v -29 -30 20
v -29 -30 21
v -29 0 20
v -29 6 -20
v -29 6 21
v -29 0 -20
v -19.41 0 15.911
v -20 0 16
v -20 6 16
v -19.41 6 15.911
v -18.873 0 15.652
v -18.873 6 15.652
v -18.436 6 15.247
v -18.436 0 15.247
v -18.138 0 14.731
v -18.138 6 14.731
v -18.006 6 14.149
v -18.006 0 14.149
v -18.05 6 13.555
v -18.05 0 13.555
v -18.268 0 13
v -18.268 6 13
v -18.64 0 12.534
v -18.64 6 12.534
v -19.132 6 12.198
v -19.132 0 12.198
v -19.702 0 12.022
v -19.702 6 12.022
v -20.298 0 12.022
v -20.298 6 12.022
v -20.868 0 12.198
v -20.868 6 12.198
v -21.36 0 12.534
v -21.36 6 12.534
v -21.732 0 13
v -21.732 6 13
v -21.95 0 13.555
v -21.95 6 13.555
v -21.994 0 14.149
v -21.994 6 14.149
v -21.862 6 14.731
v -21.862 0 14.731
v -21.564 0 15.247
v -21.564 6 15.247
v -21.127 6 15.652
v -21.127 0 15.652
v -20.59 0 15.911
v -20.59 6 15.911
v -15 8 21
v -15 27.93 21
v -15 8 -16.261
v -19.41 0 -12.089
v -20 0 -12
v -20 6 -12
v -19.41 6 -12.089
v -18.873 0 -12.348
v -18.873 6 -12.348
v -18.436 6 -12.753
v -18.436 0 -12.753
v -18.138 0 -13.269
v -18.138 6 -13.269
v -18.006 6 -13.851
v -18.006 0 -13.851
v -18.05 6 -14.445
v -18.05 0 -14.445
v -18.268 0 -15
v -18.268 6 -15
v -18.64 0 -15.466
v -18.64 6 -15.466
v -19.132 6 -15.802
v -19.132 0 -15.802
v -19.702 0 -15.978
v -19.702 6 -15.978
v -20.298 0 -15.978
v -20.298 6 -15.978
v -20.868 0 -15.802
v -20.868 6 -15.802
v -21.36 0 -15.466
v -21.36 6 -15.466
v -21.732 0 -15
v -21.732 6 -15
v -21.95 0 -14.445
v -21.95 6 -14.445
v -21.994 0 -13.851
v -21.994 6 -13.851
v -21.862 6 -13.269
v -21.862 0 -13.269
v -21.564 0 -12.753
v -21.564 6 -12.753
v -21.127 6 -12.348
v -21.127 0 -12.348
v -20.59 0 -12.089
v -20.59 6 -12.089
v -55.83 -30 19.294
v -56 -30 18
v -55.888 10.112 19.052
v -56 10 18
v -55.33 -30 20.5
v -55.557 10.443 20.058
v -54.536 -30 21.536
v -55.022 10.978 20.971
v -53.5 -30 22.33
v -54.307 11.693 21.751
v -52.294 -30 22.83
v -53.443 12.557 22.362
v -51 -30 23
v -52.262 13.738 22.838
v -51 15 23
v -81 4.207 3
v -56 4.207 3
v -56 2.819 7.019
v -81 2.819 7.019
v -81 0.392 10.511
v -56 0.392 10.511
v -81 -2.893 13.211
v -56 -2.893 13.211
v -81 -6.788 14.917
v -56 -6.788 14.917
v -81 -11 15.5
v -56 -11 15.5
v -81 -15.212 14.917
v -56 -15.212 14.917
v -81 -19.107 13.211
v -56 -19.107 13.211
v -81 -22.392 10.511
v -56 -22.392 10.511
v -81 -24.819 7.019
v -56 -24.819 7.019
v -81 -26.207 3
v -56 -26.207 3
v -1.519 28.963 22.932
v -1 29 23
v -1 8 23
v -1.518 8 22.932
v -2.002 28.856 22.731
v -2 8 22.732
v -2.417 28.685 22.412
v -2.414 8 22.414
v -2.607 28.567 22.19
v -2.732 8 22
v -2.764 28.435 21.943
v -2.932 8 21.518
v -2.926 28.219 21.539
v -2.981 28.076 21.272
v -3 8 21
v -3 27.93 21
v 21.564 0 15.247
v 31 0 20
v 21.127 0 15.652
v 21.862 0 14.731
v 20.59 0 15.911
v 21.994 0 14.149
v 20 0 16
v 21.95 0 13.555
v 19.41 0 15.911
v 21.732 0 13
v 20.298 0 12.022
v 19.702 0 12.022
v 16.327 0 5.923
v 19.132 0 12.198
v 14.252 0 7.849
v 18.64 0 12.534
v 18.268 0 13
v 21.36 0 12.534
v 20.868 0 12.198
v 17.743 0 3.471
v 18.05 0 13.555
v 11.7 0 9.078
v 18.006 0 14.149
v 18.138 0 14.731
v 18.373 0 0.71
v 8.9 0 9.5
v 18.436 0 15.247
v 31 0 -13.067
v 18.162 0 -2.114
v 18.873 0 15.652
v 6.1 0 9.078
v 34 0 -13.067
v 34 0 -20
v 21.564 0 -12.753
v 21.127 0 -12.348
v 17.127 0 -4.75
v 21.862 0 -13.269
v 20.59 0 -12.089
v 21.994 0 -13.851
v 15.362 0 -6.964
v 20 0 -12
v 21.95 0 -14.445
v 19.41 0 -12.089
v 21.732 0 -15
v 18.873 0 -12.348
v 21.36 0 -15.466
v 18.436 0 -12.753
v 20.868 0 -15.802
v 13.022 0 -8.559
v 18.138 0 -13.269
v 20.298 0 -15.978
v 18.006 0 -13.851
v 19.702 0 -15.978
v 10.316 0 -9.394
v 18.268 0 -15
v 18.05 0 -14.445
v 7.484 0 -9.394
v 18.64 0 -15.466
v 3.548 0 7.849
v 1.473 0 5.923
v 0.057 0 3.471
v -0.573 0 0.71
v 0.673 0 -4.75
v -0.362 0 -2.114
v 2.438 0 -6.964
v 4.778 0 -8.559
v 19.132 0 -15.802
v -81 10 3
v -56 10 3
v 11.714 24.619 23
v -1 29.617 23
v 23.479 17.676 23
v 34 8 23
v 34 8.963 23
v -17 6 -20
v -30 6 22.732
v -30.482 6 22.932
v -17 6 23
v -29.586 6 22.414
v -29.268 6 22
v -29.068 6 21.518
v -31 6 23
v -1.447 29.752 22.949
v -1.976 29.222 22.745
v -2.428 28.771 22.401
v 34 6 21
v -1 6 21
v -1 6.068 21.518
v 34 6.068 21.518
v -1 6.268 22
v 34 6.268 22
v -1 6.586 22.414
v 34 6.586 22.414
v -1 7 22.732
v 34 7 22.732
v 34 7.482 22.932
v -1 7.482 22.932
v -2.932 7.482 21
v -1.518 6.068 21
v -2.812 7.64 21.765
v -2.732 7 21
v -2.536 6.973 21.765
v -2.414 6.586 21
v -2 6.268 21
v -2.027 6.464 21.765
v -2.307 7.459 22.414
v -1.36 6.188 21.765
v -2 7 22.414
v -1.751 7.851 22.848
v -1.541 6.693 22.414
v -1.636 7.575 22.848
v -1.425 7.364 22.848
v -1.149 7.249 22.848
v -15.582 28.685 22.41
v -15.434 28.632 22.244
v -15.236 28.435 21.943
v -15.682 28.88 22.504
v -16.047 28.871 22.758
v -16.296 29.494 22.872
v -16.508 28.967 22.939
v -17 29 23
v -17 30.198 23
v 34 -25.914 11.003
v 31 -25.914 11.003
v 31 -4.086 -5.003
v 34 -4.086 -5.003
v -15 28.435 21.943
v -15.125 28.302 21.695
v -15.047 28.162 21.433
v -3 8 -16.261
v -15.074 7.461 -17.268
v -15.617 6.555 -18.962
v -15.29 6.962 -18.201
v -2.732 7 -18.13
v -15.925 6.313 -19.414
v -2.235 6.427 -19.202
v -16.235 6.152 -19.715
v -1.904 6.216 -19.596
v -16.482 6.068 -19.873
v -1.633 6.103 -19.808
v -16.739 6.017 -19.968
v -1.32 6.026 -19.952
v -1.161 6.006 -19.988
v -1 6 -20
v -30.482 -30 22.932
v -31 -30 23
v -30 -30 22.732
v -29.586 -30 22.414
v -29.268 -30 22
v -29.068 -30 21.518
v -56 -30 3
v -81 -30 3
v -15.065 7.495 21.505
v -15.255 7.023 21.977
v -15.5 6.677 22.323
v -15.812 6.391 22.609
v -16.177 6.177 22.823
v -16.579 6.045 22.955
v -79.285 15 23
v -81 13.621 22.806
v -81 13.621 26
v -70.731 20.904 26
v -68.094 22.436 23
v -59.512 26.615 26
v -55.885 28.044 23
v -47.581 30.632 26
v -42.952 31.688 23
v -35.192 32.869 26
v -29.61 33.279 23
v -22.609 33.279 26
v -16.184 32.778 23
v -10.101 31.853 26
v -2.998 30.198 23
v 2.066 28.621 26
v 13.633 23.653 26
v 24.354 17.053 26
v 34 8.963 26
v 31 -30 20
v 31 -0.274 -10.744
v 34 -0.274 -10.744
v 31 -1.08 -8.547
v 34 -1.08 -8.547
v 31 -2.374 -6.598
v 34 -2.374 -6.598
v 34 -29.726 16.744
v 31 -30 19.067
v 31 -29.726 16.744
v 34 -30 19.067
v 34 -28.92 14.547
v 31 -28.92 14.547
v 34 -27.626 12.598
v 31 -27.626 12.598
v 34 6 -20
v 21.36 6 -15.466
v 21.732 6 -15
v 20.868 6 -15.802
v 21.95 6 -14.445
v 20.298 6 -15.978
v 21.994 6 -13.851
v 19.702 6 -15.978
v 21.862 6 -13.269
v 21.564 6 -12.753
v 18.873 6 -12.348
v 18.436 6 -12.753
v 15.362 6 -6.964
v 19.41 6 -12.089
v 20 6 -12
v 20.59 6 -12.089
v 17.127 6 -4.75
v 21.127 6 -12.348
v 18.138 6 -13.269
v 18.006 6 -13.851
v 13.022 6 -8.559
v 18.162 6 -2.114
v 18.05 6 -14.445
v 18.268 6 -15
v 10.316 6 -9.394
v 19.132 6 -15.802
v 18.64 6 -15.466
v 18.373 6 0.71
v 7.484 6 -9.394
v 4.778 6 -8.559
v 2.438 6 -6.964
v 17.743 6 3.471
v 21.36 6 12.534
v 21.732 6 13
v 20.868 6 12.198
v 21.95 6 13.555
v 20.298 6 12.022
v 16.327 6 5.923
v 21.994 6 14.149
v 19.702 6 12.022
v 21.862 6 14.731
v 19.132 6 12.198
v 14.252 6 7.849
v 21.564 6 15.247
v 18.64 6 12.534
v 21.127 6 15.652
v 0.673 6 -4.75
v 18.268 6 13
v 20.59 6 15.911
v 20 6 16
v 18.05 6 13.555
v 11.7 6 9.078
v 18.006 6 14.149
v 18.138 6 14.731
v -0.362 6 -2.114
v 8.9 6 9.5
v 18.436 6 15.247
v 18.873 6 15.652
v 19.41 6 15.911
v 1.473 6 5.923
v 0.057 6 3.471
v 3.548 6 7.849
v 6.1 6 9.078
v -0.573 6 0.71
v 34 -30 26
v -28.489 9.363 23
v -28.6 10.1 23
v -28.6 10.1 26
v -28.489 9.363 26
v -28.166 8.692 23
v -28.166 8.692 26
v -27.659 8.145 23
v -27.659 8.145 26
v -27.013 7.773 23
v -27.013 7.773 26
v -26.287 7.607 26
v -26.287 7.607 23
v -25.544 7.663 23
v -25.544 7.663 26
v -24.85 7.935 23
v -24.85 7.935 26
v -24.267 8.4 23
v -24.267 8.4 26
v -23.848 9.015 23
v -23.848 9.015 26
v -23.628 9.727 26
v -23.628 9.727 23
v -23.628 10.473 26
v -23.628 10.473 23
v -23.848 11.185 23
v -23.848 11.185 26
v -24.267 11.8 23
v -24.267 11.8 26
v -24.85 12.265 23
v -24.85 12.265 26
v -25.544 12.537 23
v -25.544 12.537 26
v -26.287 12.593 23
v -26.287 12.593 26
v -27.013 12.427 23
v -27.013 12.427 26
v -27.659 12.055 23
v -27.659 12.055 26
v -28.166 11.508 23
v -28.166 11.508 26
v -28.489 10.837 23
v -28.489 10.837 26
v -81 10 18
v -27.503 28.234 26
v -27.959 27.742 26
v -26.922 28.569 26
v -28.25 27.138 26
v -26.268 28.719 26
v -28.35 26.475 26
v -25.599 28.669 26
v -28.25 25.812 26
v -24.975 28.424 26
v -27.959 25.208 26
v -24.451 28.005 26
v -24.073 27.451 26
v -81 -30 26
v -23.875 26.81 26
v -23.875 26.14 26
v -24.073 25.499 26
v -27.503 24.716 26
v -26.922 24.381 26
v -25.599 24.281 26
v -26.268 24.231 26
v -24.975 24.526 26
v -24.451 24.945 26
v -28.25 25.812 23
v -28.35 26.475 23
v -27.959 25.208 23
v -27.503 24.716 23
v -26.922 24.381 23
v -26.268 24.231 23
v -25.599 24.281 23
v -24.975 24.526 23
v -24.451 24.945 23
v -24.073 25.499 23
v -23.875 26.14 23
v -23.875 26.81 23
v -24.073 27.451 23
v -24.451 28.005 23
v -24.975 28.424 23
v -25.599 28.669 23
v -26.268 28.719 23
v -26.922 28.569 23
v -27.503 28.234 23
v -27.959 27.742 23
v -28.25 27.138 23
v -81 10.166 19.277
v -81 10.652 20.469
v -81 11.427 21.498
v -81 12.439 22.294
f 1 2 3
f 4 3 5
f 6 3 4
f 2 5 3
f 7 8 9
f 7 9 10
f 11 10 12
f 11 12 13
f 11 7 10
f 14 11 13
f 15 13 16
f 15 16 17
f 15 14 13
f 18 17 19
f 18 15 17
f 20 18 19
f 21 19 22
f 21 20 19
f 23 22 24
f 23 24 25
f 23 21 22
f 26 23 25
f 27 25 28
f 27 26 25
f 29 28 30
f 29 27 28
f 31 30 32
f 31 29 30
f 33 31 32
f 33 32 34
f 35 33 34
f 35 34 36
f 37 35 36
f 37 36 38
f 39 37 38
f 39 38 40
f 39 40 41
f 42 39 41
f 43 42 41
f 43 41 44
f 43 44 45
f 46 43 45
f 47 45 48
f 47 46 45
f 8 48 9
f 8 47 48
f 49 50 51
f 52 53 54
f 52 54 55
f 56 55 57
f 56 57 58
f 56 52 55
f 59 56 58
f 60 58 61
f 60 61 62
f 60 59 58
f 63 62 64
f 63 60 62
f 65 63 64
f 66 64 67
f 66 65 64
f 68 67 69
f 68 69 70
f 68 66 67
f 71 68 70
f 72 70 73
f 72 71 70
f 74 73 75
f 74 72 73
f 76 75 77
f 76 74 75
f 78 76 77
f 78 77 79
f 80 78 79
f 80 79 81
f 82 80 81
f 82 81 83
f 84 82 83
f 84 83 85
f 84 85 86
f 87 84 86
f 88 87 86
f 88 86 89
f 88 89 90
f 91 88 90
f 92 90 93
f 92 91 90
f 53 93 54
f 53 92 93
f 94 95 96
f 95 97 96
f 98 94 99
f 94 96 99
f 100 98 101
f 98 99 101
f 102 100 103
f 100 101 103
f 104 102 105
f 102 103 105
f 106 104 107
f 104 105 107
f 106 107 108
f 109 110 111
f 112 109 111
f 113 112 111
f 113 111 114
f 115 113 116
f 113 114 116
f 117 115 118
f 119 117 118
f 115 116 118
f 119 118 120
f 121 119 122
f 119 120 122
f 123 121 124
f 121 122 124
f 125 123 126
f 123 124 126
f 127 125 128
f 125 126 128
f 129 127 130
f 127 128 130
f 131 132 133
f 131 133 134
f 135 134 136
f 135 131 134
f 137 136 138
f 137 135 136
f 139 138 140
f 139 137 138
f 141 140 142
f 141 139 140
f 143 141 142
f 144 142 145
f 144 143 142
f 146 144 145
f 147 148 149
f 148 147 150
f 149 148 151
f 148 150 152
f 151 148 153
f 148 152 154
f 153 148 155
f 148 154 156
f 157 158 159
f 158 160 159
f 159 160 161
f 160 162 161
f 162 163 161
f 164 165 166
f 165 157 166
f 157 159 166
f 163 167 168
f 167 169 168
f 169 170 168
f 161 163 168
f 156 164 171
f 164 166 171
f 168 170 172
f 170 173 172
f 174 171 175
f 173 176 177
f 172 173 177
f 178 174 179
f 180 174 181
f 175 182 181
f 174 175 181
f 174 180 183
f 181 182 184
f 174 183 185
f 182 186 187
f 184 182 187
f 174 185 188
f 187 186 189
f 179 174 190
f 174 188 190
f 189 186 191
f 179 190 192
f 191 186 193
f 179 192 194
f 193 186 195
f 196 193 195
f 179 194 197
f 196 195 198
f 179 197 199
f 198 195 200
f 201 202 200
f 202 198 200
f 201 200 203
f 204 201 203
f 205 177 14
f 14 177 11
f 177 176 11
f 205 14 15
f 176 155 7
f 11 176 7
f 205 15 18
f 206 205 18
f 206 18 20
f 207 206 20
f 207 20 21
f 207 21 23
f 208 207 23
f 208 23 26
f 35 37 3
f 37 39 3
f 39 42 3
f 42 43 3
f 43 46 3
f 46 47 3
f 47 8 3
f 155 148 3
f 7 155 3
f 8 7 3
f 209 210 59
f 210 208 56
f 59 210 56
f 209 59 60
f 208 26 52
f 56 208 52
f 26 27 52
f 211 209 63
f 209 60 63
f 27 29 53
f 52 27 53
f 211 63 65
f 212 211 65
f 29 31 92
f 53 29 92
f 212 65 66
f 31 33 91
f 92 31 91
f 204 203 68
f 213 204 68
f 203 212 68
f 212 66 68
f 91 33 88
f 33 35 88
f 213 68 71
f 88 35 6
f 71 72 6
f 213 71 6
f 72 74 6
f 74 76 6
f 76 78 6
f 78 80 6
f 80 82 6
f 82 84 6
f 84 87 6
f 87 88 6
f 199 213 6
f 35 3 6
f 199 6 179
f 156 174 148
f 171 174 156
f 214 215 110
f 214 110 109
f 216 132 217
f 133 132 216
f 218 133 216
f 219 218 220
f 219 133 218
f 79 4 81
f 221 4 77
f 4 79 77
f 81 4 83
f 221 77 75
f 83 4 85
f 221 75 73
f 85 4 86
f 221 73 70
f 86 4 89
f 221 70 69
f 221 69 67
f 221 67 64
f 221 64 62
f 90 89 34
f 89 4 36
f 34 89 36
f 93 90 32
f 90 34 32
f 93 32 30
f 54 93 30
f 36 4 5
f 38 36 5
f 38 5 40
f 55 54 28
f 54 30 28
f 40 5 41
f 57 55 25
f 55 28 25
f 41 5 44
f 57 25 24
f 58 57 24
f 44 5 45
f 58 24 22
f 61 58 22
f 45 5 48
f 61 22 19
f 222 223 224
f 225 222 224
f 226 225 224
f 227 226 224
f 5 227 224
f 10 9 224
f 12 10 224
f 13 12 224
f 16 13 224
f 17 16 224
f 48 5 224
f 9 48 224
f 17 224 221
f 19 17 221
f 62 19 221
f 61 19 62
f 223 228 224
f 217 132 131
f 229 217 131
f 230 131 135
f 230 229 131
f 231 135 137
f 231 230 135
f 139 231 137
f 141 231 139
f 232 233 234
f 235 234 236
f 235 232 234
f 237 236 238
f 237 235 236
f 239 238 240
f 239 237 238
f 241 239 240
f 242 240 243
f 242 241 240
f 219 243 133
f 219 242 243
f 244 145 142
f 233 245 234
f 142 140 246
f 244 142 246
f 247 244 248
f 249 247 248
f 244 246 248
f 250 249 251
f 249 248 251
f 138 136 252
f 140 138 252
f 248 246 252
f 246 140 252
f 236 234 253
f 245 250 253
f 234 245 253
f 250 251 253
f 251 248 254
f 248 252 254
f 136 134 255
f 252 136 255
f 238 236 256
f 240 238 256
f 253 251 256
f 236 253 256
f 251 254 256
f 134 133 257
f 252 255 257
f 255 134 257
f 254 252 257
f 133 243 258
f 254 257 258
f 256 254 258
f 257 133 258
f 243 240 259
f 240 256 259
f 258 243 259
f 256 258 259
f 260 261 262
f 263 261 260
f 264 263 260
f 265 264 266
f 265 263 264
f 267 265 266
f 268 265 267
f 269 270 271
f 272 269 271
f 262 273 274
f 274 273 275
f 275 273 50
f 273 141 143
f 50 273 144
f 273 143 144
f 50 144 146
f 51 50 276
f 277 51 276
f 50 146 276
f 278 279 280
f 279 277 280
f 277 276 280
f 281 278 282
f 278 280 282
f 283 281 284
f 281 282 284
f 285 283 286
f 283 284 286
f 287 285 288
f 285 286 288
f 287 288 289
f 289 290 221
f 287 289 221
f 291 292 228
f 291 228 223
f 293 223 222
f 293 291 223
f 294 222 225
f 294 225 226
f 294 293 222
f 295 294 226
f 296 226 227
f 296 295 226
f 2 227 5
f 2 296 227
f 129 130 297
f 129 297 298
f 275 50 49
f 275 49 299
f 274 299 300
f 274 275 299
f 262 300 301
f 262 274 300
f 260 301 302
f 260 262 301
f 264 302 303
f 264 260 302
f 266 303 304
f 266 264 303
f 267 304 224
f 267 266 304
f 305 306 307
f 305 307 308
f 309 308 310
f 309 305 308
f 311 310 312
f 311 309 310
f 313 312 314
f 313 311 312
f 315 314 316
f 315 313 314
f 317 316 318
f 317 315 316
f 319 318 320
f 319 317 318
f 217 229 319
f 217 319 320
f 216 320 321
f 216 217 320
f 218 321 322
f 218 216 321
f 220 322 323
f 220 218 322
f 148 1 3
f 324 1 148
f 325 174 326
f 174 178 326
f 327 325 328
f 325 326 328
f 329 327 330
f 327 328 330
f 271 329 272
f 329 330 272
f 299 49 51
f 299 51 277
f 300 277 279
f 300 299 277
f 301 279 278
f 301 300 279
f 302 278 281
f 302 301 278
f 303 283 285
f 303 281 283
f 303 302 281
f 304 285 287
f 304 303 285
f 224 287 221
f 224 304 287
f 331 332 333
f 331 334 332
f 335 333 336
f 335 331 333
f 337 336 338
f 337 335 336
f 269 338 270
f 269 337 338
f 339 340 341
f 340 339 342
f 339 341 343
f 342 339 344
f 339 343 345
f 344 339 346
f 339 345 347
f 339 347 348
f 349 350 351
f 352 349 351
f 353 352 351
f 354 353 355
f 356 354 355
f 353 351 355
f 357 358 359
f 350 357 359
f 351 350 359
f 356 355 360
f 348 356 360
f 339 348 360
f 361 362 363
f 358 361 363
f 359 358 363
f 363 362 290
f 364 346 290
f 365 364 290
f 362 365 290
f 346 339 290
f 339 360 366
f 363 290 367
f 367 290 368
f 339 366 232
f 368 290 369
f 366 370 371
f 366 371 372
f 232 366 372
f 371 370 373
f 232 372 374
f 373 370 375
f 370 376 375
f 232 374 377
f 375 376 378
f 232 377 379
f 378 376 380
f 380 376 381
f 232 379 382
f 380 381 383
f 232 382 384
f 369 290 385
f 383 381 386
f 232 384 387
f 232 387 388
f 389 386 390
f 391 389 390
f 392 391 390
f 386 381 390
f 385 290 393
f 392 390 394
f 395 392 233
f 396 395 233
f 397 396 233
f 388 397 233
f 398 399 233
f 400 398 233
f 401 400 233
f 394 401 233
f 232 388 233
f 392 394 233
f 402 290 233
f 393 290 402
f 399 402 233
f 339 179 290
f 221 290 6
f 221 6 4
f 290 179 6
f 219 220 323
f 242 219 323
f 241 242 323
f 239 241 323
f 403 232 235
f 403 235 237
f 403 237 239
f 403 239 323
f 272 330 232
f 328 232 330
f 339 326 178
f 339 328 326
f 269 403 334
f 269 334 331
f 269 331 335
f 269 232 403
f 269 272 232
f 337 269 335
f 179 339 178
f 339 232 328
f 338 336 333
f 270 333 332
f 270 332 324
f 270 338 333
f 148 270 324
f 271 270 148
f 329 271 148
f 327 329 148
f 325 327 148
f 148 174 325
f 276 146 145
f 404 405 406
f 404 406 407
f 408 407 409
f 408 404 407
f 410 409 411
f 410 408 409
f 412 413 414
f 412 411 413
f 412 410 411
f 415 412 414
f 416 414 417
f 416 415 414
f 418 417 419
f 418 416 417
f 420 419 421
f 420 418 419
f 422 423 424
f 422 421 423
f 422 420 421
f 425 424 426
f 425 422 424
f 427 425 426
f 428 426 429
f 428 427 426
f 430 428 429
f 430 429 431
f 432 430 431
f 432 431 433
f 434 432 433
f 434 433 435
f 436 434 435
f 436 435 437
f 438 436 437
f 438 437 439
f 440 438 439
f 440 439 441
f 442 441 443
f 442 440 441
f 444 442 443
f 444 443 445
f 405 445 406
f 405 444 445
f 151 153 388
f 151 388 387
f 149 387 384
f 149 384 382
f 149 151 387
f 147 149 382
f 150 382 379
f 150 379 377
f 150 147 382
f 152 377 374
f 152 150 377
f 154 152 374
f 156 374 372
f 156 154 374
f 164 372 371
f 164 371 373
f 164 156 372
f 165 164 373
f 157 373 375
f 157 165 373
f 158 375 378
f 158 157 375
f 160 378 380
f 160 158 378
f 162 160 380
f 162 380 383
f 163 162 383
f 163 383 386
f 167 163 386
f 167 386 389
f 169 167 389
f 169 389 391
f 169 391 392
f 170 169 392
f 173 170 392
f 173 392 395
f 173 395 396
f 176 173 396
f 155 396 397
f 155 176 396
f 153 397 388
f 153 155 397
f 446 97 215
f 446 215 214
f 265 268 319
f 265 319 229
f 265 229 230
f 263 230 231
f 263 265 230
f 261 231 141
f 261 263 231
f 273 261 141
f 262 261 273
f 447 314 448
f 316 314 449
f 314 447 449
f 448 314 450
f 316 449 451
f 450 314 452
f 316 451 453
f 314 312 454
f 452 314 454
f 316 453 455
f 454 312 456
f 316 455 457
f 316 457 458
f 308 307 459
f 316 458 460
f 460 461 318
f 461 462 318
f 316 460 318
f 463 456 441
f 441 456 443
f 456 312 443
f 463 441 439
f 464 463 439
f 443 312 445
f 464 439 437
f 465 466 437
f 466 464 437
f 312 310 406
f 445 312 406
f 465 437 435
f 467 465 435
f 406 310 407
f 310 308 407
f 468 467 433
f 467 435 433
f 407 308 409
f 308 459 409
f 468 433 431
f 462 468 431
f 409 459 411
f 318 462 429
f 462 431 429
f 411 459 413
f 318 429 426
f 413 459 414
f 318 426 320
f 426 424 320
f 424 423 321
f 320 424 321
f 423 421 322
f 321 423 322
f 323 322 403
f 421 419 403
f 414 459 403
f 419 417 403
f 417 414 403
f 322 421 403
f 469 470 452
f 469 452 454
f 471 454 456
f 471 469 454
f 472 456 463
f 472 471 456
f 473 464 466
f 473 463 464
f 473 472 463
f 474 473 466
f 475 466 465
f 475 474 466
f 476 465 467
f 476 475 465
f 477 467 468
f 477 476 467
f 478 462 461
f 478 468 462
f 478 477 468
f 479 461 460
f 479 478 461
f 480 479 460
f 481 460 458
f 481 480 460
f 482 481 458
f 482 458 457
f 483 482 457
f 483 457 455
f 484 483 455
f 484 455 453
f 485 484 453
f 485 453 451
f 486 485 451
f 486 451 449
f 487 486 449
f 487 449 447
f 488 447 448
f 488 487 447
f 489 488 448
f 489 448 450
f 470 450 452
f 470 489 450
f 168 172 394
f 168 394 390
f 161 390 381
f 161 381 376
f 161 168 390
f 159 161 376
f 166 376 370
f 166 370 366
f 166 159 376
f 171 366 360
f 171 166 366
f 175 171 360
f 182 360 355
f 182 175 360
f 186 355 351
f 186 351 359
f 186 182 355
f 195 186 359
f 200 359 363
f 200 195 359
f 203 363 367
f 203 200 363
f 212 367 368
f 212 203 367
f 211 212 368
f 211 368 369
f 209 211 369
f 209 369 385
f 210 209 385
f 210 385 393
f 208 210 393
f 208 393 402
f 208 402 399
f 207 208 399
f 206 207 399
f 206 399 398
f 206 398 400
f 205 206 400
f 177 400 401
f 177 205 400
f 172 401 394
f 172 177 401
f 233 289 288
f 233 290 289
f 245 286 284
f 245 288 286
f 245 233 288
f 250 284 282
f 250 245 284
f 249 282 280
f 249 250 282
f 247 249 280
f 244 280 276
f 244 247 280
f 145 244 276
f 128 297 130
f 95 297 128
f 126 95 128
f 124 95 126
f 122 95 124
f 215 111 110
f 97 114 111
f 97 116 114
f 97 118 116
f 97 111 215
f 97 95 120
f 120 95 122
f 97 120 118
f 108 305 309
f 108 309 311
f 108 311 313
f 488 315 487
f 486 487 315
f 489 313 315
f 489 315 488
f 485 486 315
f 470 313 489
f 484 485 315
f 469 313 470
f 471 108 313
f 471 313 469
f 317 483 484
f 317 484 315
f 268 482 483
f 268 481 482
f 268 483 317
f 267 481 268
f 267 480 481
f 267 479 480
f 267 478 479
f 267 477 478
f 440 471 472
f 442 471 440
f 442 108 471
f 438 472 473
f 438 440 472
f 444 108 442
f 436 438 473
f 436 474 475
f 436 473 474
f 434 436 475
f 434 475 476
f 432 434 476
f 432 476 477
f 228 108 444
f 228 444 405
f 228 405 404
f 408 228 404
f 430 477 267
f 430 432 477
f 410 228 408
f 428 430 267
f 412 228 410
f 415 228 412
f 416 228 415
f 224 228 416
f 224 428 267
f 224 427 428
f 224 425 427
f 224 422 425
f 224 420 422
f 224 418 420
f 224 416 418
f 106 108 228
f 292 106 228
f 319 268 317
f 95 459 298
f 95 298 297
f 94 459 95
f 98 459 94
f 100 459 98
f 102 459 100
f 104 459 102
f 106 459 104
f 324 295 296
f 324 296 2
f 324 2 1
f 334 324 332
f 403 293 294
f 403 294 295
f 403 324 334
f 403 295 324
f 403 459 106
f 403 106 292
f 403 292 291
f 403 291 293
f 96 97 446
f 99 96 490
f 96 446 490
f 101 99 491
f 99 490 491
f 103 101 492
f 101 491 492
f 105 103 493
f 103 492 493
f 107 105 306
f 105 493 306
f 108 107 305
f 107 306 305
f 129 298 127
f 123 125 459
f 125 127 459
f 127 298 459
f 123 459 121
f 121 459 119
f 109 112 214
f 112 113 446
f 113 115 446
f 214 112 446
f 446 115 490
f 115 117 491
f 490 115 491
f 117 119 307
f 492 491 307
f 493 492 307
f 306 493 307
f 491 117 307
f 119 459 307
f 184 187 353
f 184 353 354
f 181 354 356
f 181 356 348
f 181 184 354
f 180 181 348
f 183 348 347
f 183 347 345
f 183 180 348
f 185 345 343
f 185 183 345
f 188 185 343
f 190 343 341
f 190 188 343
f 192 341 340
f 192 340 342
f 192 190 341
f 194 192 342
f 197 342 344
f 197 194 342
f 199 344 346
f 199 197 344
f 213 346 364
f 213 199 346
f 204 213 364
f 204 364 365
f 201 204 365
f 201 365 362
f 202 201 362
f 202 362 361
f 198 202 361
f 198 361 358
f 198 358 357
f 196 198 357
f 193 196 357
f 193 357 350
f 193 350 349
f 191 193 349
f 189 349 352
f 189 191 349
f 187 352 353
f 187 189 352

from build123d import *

# Parameters (mm, degrees)
SKETCH2_W                      = 58
SKETCH2_H                      = 40
SKETCH2_R                      = 2
SKETCH2_R_2                    = 9.5
BOSS_EXTRUDE1_DEPTH            = 6
BOSS_EXTRUDE2_DEPTH            = 6
BOSS_EXTRUDE2_DEPTH_BACK       = 30
SKETCH3_W                      = 58
SKETCH3_H                      = 3
BOSS_EXTRUDE4_DEPTH            = 39
BOSS_EXTRUDE4_DEPTH_BACK       = 30
SKETCH7_W                      = 115
SKETCH7_H                      = 3
CUT_EXTRUDE1_DEPTH             = 94.584186698
SKETCH5_R                      = 2.25
SKETCH5_R_2                    = 2.5
CUT_EXTRUDE2_DEPTH             = 92.374080023
BOSS_EXTRUDE3_DEPTH            = 10
BOSS_EXTRUDE3_DEPTH_BACK       = 2
SKETCH8_W                      = 25
SKETCH8_H                      = 40
BOSS_EXTRUDE5_DEPTH            = 20
SKETCH9_R                      = 15.499999921
CUT_EXTRUDE3_DEPTH             = 80.228924642
BOSS_EXTRUDE6_DEPTH            = 5
FILLET2_R                      = 5
CUT_EXTRUDE4_REACH             = 93.374
SKETCH12_W                     = 2
SKETCH12_H                     = 30
CUT_EXTRUDE4_DIRECTION_2_DEPTH = 92.374080176
FILLET1_R                      = 2
FILLET3_R                      = 10


with BuildPart() as part:
    # Sketch2 → Boss-Extrude1 (new body)
    with BuildSketch(Plane(origin=(0, 0, 0), x_dir=(1, 0, 0), z_dir=(0, 1, 0))):
        Rectangle(SKETCH2_W, SKETCH2_H)
        with Locations(Location((-20, 14, 0), (0, 0, 270))):
            Circle(SKETCH2_R, mode=Mode.SUBTRACT)
        with Locations(Location((20, 14, 0), (0, 0, 270))):
            Circle(SKETCH2_R, mode=Mode.SUBTRACT)
        with Locations(Location((20, -14, 0), (0, 0, 270))):
            Circle(SKETCH2_R, mode=Mode.SUBTRACT)
        with Locations(Location((-20, -14, 0), (0, 0, 270))):
            Circle(SKETCH2_R, mode=Mode.SUBTRACT)
        with Locations(Location((8.9, 0, 0), (0, 0, 270))):
            Circle(SKETCH2_R_2, mode=Mode.SUBTRACT)
    extrude(amount=BOSS_EXTRUDE1_DEPTH)

    # Sketch3 → Boss-Extrude2 (add, two sides: drawn at the far end of the back side and taken through both)
    with BuildSketch(Plane(origin=(0, 0, 0), x_dir=(1, 0, 0), z_dir=(0, 1, 0)).offset(-BOSS_EXTRUDE2_DEPTH_BACK)):
        with Locations((0, -21.5)):
            Rectangle(SKETCH3_W, SKETCH3_H)
    extrude(amount=BOSS_EXTRUDE2_DEPTH + BOSS_EXTRUDE2_DEPTH_BACK)

    # Sketch7 → Boss-Extrude4 (add, two sides: drawn at the far end of the back side and taken through both)
    with BuildSketch(Plane(origin=(0, 0, 0), x_dir=(1, 0, 0), z_dir=(0, 1, 0)).offset(-BOSS_EXTRUDE4_DEPTH_BACK)):
        with Locations((-23.5, -24.5)):
            Rectangle(SKETCH7_W, SKETCH7_H)
    extrude(amount=BOSS_EXTRUDE4_DEPTH + BOSS_EXTRUDE4_DEPTH_BACK)

    # Sketch4 → Cut-Extrude1 (cut, through all)
    with BuildSketch(Plane.XY):
        with BuildLine():
            Line((-81, 13.621067419), (-81, 45.200754785))
            Line((-81, 45.200754785), (34, 45.200754785))
            Line((34, 45.200754785), (34, 8.963176429))
            ThreePointArc((34, 8.963176429), (-22.609442943, 33.279339271), (-81, 13.621067419))
        make_face()
    extrude(amount=CUT_EXTRUDE1_DEPTH, mode=Mode.SUBTRACT)

    # Sketch5 → Cut-Extrude2 (cut, through all)
    with BuildSketch(Plane.XY):
        with Locations(Location((-26.099999185, 26.475, 0), (0, 0, 180))):
            Circle(SKETCH5_R)
        with Locations(Location((-26.099999185, 10.1, 0), (0, 0, 180))):
            Circle(SKETCH5_R_2)
    extrude(amount=CUT_EXTRUDE2_DEPTH, mode=Mode.SUBTRACT)

    # Sketch6 → Boss-Extrude3 (add, two sides: drawn at the far end of the back side and taken through both)
    with BuildSketch(Plane(origin=(-13, 0, 0), x_dir=(0, 0, -1), z_dir=(1, 0, 0)).offset(-BOSS_EXTRUDE3_DEPTH_BACK)):
        Polygon((20, 6), (-23, 29), (-23, 6), align=None)
    extrude(amount=BOSS_EXTRUDE3_DEPTH + BOSS_EXTRUDE3_DEPTH_BACK)

    # Sketch8 → Boss-Extrude5 (add)
    with BuildSketch(Plane(origin=(0, 0, 23), x_dir=(-1, 0, 0), z_dir=(0, 0, -1))):
        with Locations((68.5, -10)):
            Rectangle(SKETCH8_W, SKETCH8_H)
    extrude(amount=BOSS_EXTRUDE5_DEPTH)

    # Sketch9 → Cut-Extrude3 (cut, through all)
    with BuildSketch(Plane(origin=(-33, 0, 0), x_dir=(0, 0, -1), z_dir=(1, 0, 0))):
        with Locations((-2.25e-07, -11)):
            Circle(SKETCH9_R)
    extrude(amount=-CUT_EXTRUDE3_DEPTH, mode=Mode.SUBTRACT)

    # Sketch10 → Boss-Extrude6 (add)
    with BuildSketch(Plane(origin=(29, 0, 0), x_dir=(0, 0, -1), z_dir=(1, 0, 0))):
        Polygon((20, 0), (20, 6), (-26, 6), (-26, -30), (-14, -30), (8, 0), align=None)
    extrude(amount=BOSS_EXTRUDE6_DEPTH)

    # Fillet2
    fillet2_edges = [part.edges().sort_by_distance(p)[0] for p in [
        (-68.5, 10, 23),
        (-56, -10, 23),
    ]]
    fillet(fillet2_edges, radius=FILLET2_R)

    # Cut-Extrude4: up to this face of the body (flat: up to its plane)
    cut_extrude4_end = Plane(part.part.faces().sort_by_distance((0, -15, 20))[0])
    # Sketch12 → Cut-Extrude4 (cut, up to the picked face)
    with BuildSketch(Plane.XY, mode=Mode.PRIVATE) as cut_extrude4_sk1:
        with Locations((30, -15)):
            Rectangle(SKETCH12_W, SKETCH12_H)
    cut_extrude4_tool1 = split(extrude(cut_extrude4_sk1.sketch, amount=CUT_EXTRUDE4_REACH, mode=Mode.PRIVATE), bisect_by=cut_extrude4_end, keep=Keep.BOTH, mode=Mode.PRIVATE)
    add(cut_extrude4_tool1.solids().sort_by(Axis((30, -15, 0), (0, 0, 1)))[0], mode=Mode.SUBTRACT)

    # Sketch12 → Cut-Extrude4 direction 2 (cut)
    with BuildSketch(Plane.XY):
        with Locations((30, -15)):
            Rectangle(SKETCH12_W, SKETCH12_H)
    extrude(amount=-CUT_EXTRUDE4_DIRECTION_2_DEPTH, mode=Mode.SUBTRACT)

    # Fillet1
    # the kernel refuses this fillet: 2 mm, written as the material it adds along each edge
    with BuildSketch(Plane(origin=(-1, 8, 21), x_dir=(-1, 0, 0), z_dir=(0, 0, 1))) as fillet1_piece_1_section:
        Polygon((0, 0), (FILLET1_R * 1.02, 0), (FILLET1_R * 1.02, FILLET1_R * 1.02), (0, FILLET1_R * 1.02), align=None)
    fillet1_piece_1 = extrude(amount=FILLET1_R * 1.02, mode=Mode.PRIVATE)
    fillet1_piece_1 = fillet1_piece_1 - Plane(origin=(-1, 8, 21), x_dir=(0.7071067811865475, 0.7071067811865475, 0), z_dir=(0, 0, 1)) * Sphere(FILLET1_R, mode=Mode.PRIVATE)
    add(fillet1_piece_1)
    with BuildSketch(Plane(origin=(-15, 6, 23), x_dir=(0, 1, 0), z_dir=(0, 0, -1))) as fillet1_piece_2_section:
        with BuildLine():
            CenterArc((FILLET1_R, -FILLET1_R), FILLET1_R, 90, 90)
            Line((0, -FILLET1_R), (-FILLET1_R * 0.02, -FILLET1_R))
            Line((-FILLET1_R * 0.02, -FILLET1_R), (-FILLET1_R * 0.02, FILLET1_R * 0.02))
            Line((-FILLET1_R * 0.02, FILLET1_R * 0.02), (FILLET1_R, FILLET1_R * 0.02))
            Line((FILLET1_R, FILLET1_R * 0.02), (FILLET1_R, 0))
        make_face()
    fillet1_piece_2 = extrude(amount=43, mode=Mode.PRIVATE)
    fillet1_piece_2 = split(fillet1_piece_2, bisect_by=Plane(origin=(-15.457624132, 15.214131113, -2.773580962), z_dir=(0, -0.8817846419346917, 0.47165225033716063)), keep=Keep.TOP, mode=Mode.PRIVATE)
    add(fillet1_piece_2)
    with BuildSketch(Plane(origin=(-3, 6, 21), x_dir=(0, 1, 0), z_dir=(0, 0, -1))) as fillet1_piece_3_section:
        with BuildLine():
            CenterArc((FILLET1_R, FILLET1_R), FILLET1_R, 180, 90)
            Line((0, FILLET1_R), (-FILLET1_R * 0.02, FILLET1_R))
            Line((-FILLET1_R * 0.02, FILLET1_R), (-FILLET1_R * 0.02, -FILLET1_R * 0.02))
            Line((-FILLET1_R * 0.02, -FILLET1_R * 0.02), (FILLET1_R, -FILLET1_R * 0.02))
            Line((FILLET1_R, -FILLET1_R * 0.02), (FILLET1_R, 0))
        make_face()
    fillet1_piece_3 = extrude(amount=41, mode=Mode.PRIVATE)
    fillet1_piece_3 = split(fillet1_piece_3, bisect_by=Plane(origin=(-2.542135078, 14.797986004, -3.551591383), z_dir=(0, -0.8817846419346917, 0.47165225033716063)), keep=Keep.TOP, mode=Mode.PRIVATE)
    add(fillet1_piece_3)
    with BuildSketch(Plane(origin=(-3, 34, 23), x_dir=(1, 0, 0), z_dir=(0, -1, 0))) as fillet1_piece_4_section:
        with BuildLine():
            CenterArc((FILLET1_R, -FILLET1_R), FILLET1_R, 90, 90)
            Line((0, -FILLET1_R), (-FILLET1_R * 0.02, -FILLET1_R))
            Line((-FILLET1_R * 0.02, -FILLET1_R), (-FILLET1_R * 0.02, FILLET1_R * 0.02))
            Line((-FILLET1_R * 0.02, FILLET1_R * 0.02), (FILLET1_R, FILLET1_R * 0.02))
            Line((FILLET1_R, FILLET1_R * 0.02), (FILLET1_R, 0))
        make_face()
    fillet1_piece_4 = extrude(amount=26, mode=Mode.PRIVATE)
    fillet1_piece_4 = split(fillet1_piece_4, bisect_by=Plane(origin=(-2.544379772, 26.451239118, 18.234925307), z_dir=(0, -0.8817846419346917, 0.47165225033716063)), keep=Keep.TOP, mode=Mode.PRIVATE)
    add(fillet1_piece_4)
    with BuildSketch(Plane(origin=(34, 6, 23), x_dir=(0, 1, 0), z_dir=(-1, 0, 0))) as fillet1_piece_5:
        with BuildLine():
            CenterArc((FILLET1_R, FILLET1_R), FILLET1_R, 180, 90)
            Line((0, FILLET1_R), (-FILLET1_R * 0.02, FILLET1_R))
            Line((-FILLET1_R * 0.02, FILLET1_R), (-FILLET1_R * 0.02, -FILLET1_R * 0.02))
            Line((-FILLET1_R * 0.02, -FILLET1_R * 0.02), (FILLET1_R, -FILLET1_R * 0.02))
            Line((FILLET1_R, -FILLET1_R * 0.02), (FILLET1_R, 0))
        make_face()
    extrude(amount=35)
    with BuildSketch(Plane(origin=(-15, 34, 23), x_dir=(-1, 0, 0), z_dir=(0, -1, 0))) as fillet1_piece_6_section:
        with BuildLine():
            CenterArc((FILLET1_R, FILLET1_R), FILLET1_R, 180, 90)
            Line((0, FILLET1_R), (-FILLET1_R * 0.02, FILLET1_R))
            Line((-FILLET1_R * 0.02, FILLET1_R), (-FILLET1_R * 0.02, -FILLET1_R * 0.02))
            Line((-FILLET1_R * 0.02, -FILLET1_R * 0.02), (FILLET1_R, -FILLET1_R * 0.02))
            Line((FILLET1_R, -FILLET1_R * 0.02), (FILLET1_R, 0))
        make_face()
    fillet1_piece_6 = extrude(amount=28, mode=Mode.PRIVATE)
    fillet1_piece_6 = split(fillet1_piece_6, bisect_by=Plane(origin=(-15.455371522, 26.228583138, 17.818655432), z_dir=(0, -0.8817846419346917, 0.47165225033716063)), keep=Keep.TOP, mode=Mode.PRIVATE)
    add(fillet1_piece_6)
    with BuildSketch(Plane(origin=(-29, -30, 23), x_dir=(-1, 0, 0), z_dir=(0, 1, 0))) as fillet1_piece_7:
        with BuildLine():
            CenterArc((FILLET1_R, -FILLET1_R), FILLET1_R, 90, 90)
            Line((0, -FILLET1_R), (-FILLET1_R * 0.02, -FILLET1_R))
            Line((-FILLET1_R * 0.02, -FILLET1_R), (-FILLET1_R * 0.02, FILLET1_R * 0.02))
            Line((-FILLET1_R * 0.02, FILLET1_R * 0.02), (FILLET1_R, FILLET1_R * 0.02))
            Line((FILLET1_R, FILLET1_R * 0.02), (FILLET1_R, 0))
        make_face()
    extrude(amount=36)
    with BuildSketch(Plane(origin=(-15, 29, 23), x_dir=(0, 1, 0), z_dir=(1, 0, 0))) as fillet1_piece_8:
        with BuildLine():
            CenterArc((FILLET1_R * 0.59918003165, -FILLET1_R), FILLET1_R, 90, 61.858398768)
            Line((-FILLET1_R * 0.282604610285, -FILLET1_R * 0.528347749663), (-FILLET1_R * 0.300240303123, -FILLET1_R * 0.518914704656))
            Line((-FILLET1_R * 0.300240303123, -FILLET1_R * 0.518914704656), (-FILLET1_R * 0.011983600633, FILLET1_R * 0.02))
            Line((-FILLET1_R * 0.011983600633, FILLET1_R * 0.02), (FILLET1_R * 0.59918003165, FILLET1_R * 0.02))
            Line((FILLET1_R * 0.59918003165, FILLET1_R * 0.02), (FILLET1_R * 0.59918003165, 0))
        make_face()
    extrude(amount=12)
    with BuildSketch(Plane(origin=(-15, 34, 23), x_dir=(-1, 0, 0), z_dir=(0, -1, 0))) as fillet1_piece_9a_section:
        with BuildLine():
            CenterArc((FILLET1_R, FILLET1_R), FILLET1_R, 180, 90)
            Line((0, FILLET1_R), (-FILLET1_R * 0.02, FILLET1_R))
            Line((-FILLET1_R * 0.02, FILLET1_R), (-FILLET1_R * 0.02, -FILLET1_R * 0.02))
            Line((-FILLET1_R * 0.02, -FILLET1_R * 0.02), (FILLET1_R, -FILLET1_R * 0.02))
            Line((FILLET1_R, -FILLET1_R * 0.02), (FILLET1_R, 0))
        make_face()
    fillet1_piece_9a = extrude(amount=33, mode=Mode.PRIVATE)
    fillet1_piece_9a = split(fillet1_piece_9a, bisect_by=Plane(origin=(-15.452790229, 6, 22.547209771), z_dir=(0, -1, 0)), keep=Keep.TOP, mode=Mode.PRIVATE)
    with BuildSketch(Plane(origin=(-15, 6, 28), x_dir=(0, 1, 0), z_dir=(0, 0, -1))) as fillet1_piece_9b_section:
        with BuildLine():
            CenterArc((FILLET1_R, -FILLET1_R), FILLET1_R, 90, 90)
            Line((0, -FILLET1_R), (-FILLET1_R * 0.02, -FILLET1_R))
            Line((-FILLET1_R * 0.02, -FILLET1_R), (-FILLET1_R * 0.02, FILLET1_R * 0.02))
            Line((-FILLET1_R * 0.02, FILLET1_R * 0.02), (FILLET1_R, FILLET1_R * 0.02))
            Line((FILLET1_R, FILLET1_R * 0.02), (FILLET1_R, 0))
        make_face()
    fillet1_piece_9b = extrude(amount=48, mode=Mode.PRIVATE)
    fillet1_piece_9b = split(fillet1_piece_9b, bisect_by=Plane(origin=(-15.452790229, 6.452790229, 23), z_dir=(0, 0, 1)), keep=Keep.TOP, mode=Mode.PRIVATE)
    fillet1_piece_9 = fillet1_piece_9a & fillet1_piece_9b
    add(fillet1_piece_9)
    with BuildSketch(Plane(origin=(-15, 29, 23), x_dir=(0, 1, 0), z_dir=(1, 0, 0))) as fillet1_piece_10a_section:
        with BuildLine():
            CenterArc((FILLET1_R * 0.59918003165, -FILLET1_R), FILLET1_R, 90, 61.858398768)
            Line((-FILLET1_R * 0.282604610285, -FILLET1_R * 0.528347749663), (-FILLET1_R * 0.300240303123, -FILLET1_R * 0.518914704656))
            Line((-FILLET1_R * 0.300240303123, -FILLET1_R * 0.518914704656), (-FILLET1_R * 0.011983600633, FILLET1_R * 0.02))
            Line((-FILLET1_R * 0.011983600633, FILLET1_R * 0.02), (FILLET1_R * 0.59918003165, FILLET1_R * 0.02))
            Line((FILLET1_R * 0.59918003165, FILLET1_R * 0.02), (FILLET1_R * 0.59918003165, 0))
        make_face()
    fillet1_piece_10a = extrude(amount=14.995900158, mode=Mode.PRIVATE)
    fillet1_piece_10a = fillet1_piece_10a & Plane(origin=(-26.099999185, -52.9, 22.74718016), x_dir=(0.6968115847591843, 0.717254219468519, 0), z_dir=(0, 0, -1)) * Cylinder(86.25, 35, mode=Mode.PRIVATE)
    fillet1_piece_10a = split(fillet1_piece_10a, bisect_by=Plane(origin=(-3, 29.068183889, 22.74718016), z_dir=(1, 0, 0)), keep=Keep.TOP, mode=Mode.PRIVATE)
    with BuildSketch(Plane(origin=(-3, 34, 23), x_dir=(1, 0, 0), z_dir=(0, -1, 0))) as fillet1_piece_10b_section:
        with BuildLine():
            CenterArc((FILLET1_R, -FILLET1_R), FILLET1_R, 90, 90)
            Line((0, -FILLET1_R), (-FILLET1_R * 0.02, -FILLET1_R))
            Line((-FILLET1_R * 0.02, -FILLET1_R), (-FILLET1_R * 0.02, FILLET1_R * 0.02))
            Line((-FILLET1_R * 0.02, FILLET1_R * 0.02), (FILLET1_R, FILLET1_R * 0.02))
            Line((FILLET1_R, FILLET1_R * 0.02), (FILLET1_R, 0))
        make_face()
    fillet1_piece_10b = extrude(amount=26, mode=Mode.PRIVATE)
    fillet1_piece_10b = fillet1_piece_10b & Plane(origin=(-26.099999185, -52.9, 22.447570128), x_dir=(0.6968115847591843, 0.717254219468519, 0), z_dir=(0, 0, -1)) * Cylinder(86.25, 60, mode=Mode.PRIVATE)
    fillet1_piece_10b = split(fillet1_piece_10b, bisect_by=Plane(origin=(-2.632601373, 28.859185521, 22.736738149), z_dir=(0, 0.8817846419346917, -0.47165225033716063)), keep=Keep.TOP, mode=Mode.PRIVATE)
    fillet1_piece_10 = fillet1_piece_10a & fillet1_piece_10b
    add(fillet1_piece_10)
    with BuildSketch(Plane(origin=(-15, 34, 23), x_dir=(-1, 0, 0), z_dir=(0, -1, 0))) as fillet1_piece_11a_section:
        with BuildLine():
            CenterArc((FILLET1_R, FILLET1_R), FILLET1_R, 180, 90)
            Line((0, FILLET1_R), (-FILLET1_R * 0.02, FILLET1_R))
            Line((-FILLET1_R * 0.02, FILLET1_R), (-FILLET1_R * 0.02, -FILLET1_R * 0.02))
            Line((-FILLET1_R * 0.02, -FILLET1_R * 0.02), (FILLET1_R, -FILLET1_R * 0.02))
            Line((FILLET1_R, -FILLET1_R * 0.02), (FILLET1_R, 0))
        make_face()
    fillet1_piece_11a = extrude(amount=28, mode=Mode.PRIVATE)
    fillet1_piece_11a = fillet1_piece_11a & Plane(origin=(-26.099999185, -52.9, 22.525345576), x_dir=(0.6968115847591843, 0.717254219468519, 0), z_dir=(0, 0, -1)) * Cylinder(86.25, 64, mode=Mode.PRIVATE)
    fillet1_piece_11a = split(fillet1_piece_11a, bisect_by=Plane(origin=(-15.443593733, 29.184571459, 23.34506838), z_dir=(0, 0.8817846419346917, -0.47165225033716063)), keep=Keep.TOP, mode=Mode.PRIVATE)
    with BuildSketch(Plane(origin=(-17.995900158, 29, 23), x_dir=(0, 1, 0), z_dir=(1, 0, 0))) as fillet1_piece_11b_section:
        with BuildLine():
            CenterArc((FILLET1_R * 0.59918003165, -FILLET1_R), FILLET1_R, 90, 61.858398768)
            Line((-FILLET1_R * 0.282604610285, -FILLET1_R * 0.528347749663), (-FILLET1_R * 0.300240303123, -FILLET1_R * 0.518914704656))
            Line((-FILLET1_R * 0.300240303123, -FILLET1_R * 0.518914704656), (-FILLET1_R * 0.011983600633, FILLET1_R * 0.02))
            Line((-FILLET1_R * 0.011983600633, FILLET1_R * 0.02), (FILLET1_R * 0.59918003165, FILLET1_R * 0.02))
            Line((FILLET1_R * 0.59918003165, FILLET1_R * 0.02), (FILLET1_R * 0.59918003165, 0))
        make_face()
    fillet1_piece_11b = extrude(amount=14.995900158, mode=Mode.PRIVATE)
    fillet1_piece_11b = split(fillet1_piece_11b, bisect_by=Plane(origin=(-15, 29.137483158, 22.770547831), z_dir=(-1, 0, 0)), keep=Keep.TOP, mode=Mode.PRIVATE)
    fillet1_piece_11 = fillet1_piece_11a & fillet1_piece_11b
    add(fillet1_piece_11)

    # Fillet3
    fillet3_edges = [part.edges().sort_by_distance(p)[0] for p in [
        (32.5, 0, -8),
        (32.5, -30, 14),
    ]]
    fillet(fillet3_edges, radius=FILLET3_R)


solid = part.part
